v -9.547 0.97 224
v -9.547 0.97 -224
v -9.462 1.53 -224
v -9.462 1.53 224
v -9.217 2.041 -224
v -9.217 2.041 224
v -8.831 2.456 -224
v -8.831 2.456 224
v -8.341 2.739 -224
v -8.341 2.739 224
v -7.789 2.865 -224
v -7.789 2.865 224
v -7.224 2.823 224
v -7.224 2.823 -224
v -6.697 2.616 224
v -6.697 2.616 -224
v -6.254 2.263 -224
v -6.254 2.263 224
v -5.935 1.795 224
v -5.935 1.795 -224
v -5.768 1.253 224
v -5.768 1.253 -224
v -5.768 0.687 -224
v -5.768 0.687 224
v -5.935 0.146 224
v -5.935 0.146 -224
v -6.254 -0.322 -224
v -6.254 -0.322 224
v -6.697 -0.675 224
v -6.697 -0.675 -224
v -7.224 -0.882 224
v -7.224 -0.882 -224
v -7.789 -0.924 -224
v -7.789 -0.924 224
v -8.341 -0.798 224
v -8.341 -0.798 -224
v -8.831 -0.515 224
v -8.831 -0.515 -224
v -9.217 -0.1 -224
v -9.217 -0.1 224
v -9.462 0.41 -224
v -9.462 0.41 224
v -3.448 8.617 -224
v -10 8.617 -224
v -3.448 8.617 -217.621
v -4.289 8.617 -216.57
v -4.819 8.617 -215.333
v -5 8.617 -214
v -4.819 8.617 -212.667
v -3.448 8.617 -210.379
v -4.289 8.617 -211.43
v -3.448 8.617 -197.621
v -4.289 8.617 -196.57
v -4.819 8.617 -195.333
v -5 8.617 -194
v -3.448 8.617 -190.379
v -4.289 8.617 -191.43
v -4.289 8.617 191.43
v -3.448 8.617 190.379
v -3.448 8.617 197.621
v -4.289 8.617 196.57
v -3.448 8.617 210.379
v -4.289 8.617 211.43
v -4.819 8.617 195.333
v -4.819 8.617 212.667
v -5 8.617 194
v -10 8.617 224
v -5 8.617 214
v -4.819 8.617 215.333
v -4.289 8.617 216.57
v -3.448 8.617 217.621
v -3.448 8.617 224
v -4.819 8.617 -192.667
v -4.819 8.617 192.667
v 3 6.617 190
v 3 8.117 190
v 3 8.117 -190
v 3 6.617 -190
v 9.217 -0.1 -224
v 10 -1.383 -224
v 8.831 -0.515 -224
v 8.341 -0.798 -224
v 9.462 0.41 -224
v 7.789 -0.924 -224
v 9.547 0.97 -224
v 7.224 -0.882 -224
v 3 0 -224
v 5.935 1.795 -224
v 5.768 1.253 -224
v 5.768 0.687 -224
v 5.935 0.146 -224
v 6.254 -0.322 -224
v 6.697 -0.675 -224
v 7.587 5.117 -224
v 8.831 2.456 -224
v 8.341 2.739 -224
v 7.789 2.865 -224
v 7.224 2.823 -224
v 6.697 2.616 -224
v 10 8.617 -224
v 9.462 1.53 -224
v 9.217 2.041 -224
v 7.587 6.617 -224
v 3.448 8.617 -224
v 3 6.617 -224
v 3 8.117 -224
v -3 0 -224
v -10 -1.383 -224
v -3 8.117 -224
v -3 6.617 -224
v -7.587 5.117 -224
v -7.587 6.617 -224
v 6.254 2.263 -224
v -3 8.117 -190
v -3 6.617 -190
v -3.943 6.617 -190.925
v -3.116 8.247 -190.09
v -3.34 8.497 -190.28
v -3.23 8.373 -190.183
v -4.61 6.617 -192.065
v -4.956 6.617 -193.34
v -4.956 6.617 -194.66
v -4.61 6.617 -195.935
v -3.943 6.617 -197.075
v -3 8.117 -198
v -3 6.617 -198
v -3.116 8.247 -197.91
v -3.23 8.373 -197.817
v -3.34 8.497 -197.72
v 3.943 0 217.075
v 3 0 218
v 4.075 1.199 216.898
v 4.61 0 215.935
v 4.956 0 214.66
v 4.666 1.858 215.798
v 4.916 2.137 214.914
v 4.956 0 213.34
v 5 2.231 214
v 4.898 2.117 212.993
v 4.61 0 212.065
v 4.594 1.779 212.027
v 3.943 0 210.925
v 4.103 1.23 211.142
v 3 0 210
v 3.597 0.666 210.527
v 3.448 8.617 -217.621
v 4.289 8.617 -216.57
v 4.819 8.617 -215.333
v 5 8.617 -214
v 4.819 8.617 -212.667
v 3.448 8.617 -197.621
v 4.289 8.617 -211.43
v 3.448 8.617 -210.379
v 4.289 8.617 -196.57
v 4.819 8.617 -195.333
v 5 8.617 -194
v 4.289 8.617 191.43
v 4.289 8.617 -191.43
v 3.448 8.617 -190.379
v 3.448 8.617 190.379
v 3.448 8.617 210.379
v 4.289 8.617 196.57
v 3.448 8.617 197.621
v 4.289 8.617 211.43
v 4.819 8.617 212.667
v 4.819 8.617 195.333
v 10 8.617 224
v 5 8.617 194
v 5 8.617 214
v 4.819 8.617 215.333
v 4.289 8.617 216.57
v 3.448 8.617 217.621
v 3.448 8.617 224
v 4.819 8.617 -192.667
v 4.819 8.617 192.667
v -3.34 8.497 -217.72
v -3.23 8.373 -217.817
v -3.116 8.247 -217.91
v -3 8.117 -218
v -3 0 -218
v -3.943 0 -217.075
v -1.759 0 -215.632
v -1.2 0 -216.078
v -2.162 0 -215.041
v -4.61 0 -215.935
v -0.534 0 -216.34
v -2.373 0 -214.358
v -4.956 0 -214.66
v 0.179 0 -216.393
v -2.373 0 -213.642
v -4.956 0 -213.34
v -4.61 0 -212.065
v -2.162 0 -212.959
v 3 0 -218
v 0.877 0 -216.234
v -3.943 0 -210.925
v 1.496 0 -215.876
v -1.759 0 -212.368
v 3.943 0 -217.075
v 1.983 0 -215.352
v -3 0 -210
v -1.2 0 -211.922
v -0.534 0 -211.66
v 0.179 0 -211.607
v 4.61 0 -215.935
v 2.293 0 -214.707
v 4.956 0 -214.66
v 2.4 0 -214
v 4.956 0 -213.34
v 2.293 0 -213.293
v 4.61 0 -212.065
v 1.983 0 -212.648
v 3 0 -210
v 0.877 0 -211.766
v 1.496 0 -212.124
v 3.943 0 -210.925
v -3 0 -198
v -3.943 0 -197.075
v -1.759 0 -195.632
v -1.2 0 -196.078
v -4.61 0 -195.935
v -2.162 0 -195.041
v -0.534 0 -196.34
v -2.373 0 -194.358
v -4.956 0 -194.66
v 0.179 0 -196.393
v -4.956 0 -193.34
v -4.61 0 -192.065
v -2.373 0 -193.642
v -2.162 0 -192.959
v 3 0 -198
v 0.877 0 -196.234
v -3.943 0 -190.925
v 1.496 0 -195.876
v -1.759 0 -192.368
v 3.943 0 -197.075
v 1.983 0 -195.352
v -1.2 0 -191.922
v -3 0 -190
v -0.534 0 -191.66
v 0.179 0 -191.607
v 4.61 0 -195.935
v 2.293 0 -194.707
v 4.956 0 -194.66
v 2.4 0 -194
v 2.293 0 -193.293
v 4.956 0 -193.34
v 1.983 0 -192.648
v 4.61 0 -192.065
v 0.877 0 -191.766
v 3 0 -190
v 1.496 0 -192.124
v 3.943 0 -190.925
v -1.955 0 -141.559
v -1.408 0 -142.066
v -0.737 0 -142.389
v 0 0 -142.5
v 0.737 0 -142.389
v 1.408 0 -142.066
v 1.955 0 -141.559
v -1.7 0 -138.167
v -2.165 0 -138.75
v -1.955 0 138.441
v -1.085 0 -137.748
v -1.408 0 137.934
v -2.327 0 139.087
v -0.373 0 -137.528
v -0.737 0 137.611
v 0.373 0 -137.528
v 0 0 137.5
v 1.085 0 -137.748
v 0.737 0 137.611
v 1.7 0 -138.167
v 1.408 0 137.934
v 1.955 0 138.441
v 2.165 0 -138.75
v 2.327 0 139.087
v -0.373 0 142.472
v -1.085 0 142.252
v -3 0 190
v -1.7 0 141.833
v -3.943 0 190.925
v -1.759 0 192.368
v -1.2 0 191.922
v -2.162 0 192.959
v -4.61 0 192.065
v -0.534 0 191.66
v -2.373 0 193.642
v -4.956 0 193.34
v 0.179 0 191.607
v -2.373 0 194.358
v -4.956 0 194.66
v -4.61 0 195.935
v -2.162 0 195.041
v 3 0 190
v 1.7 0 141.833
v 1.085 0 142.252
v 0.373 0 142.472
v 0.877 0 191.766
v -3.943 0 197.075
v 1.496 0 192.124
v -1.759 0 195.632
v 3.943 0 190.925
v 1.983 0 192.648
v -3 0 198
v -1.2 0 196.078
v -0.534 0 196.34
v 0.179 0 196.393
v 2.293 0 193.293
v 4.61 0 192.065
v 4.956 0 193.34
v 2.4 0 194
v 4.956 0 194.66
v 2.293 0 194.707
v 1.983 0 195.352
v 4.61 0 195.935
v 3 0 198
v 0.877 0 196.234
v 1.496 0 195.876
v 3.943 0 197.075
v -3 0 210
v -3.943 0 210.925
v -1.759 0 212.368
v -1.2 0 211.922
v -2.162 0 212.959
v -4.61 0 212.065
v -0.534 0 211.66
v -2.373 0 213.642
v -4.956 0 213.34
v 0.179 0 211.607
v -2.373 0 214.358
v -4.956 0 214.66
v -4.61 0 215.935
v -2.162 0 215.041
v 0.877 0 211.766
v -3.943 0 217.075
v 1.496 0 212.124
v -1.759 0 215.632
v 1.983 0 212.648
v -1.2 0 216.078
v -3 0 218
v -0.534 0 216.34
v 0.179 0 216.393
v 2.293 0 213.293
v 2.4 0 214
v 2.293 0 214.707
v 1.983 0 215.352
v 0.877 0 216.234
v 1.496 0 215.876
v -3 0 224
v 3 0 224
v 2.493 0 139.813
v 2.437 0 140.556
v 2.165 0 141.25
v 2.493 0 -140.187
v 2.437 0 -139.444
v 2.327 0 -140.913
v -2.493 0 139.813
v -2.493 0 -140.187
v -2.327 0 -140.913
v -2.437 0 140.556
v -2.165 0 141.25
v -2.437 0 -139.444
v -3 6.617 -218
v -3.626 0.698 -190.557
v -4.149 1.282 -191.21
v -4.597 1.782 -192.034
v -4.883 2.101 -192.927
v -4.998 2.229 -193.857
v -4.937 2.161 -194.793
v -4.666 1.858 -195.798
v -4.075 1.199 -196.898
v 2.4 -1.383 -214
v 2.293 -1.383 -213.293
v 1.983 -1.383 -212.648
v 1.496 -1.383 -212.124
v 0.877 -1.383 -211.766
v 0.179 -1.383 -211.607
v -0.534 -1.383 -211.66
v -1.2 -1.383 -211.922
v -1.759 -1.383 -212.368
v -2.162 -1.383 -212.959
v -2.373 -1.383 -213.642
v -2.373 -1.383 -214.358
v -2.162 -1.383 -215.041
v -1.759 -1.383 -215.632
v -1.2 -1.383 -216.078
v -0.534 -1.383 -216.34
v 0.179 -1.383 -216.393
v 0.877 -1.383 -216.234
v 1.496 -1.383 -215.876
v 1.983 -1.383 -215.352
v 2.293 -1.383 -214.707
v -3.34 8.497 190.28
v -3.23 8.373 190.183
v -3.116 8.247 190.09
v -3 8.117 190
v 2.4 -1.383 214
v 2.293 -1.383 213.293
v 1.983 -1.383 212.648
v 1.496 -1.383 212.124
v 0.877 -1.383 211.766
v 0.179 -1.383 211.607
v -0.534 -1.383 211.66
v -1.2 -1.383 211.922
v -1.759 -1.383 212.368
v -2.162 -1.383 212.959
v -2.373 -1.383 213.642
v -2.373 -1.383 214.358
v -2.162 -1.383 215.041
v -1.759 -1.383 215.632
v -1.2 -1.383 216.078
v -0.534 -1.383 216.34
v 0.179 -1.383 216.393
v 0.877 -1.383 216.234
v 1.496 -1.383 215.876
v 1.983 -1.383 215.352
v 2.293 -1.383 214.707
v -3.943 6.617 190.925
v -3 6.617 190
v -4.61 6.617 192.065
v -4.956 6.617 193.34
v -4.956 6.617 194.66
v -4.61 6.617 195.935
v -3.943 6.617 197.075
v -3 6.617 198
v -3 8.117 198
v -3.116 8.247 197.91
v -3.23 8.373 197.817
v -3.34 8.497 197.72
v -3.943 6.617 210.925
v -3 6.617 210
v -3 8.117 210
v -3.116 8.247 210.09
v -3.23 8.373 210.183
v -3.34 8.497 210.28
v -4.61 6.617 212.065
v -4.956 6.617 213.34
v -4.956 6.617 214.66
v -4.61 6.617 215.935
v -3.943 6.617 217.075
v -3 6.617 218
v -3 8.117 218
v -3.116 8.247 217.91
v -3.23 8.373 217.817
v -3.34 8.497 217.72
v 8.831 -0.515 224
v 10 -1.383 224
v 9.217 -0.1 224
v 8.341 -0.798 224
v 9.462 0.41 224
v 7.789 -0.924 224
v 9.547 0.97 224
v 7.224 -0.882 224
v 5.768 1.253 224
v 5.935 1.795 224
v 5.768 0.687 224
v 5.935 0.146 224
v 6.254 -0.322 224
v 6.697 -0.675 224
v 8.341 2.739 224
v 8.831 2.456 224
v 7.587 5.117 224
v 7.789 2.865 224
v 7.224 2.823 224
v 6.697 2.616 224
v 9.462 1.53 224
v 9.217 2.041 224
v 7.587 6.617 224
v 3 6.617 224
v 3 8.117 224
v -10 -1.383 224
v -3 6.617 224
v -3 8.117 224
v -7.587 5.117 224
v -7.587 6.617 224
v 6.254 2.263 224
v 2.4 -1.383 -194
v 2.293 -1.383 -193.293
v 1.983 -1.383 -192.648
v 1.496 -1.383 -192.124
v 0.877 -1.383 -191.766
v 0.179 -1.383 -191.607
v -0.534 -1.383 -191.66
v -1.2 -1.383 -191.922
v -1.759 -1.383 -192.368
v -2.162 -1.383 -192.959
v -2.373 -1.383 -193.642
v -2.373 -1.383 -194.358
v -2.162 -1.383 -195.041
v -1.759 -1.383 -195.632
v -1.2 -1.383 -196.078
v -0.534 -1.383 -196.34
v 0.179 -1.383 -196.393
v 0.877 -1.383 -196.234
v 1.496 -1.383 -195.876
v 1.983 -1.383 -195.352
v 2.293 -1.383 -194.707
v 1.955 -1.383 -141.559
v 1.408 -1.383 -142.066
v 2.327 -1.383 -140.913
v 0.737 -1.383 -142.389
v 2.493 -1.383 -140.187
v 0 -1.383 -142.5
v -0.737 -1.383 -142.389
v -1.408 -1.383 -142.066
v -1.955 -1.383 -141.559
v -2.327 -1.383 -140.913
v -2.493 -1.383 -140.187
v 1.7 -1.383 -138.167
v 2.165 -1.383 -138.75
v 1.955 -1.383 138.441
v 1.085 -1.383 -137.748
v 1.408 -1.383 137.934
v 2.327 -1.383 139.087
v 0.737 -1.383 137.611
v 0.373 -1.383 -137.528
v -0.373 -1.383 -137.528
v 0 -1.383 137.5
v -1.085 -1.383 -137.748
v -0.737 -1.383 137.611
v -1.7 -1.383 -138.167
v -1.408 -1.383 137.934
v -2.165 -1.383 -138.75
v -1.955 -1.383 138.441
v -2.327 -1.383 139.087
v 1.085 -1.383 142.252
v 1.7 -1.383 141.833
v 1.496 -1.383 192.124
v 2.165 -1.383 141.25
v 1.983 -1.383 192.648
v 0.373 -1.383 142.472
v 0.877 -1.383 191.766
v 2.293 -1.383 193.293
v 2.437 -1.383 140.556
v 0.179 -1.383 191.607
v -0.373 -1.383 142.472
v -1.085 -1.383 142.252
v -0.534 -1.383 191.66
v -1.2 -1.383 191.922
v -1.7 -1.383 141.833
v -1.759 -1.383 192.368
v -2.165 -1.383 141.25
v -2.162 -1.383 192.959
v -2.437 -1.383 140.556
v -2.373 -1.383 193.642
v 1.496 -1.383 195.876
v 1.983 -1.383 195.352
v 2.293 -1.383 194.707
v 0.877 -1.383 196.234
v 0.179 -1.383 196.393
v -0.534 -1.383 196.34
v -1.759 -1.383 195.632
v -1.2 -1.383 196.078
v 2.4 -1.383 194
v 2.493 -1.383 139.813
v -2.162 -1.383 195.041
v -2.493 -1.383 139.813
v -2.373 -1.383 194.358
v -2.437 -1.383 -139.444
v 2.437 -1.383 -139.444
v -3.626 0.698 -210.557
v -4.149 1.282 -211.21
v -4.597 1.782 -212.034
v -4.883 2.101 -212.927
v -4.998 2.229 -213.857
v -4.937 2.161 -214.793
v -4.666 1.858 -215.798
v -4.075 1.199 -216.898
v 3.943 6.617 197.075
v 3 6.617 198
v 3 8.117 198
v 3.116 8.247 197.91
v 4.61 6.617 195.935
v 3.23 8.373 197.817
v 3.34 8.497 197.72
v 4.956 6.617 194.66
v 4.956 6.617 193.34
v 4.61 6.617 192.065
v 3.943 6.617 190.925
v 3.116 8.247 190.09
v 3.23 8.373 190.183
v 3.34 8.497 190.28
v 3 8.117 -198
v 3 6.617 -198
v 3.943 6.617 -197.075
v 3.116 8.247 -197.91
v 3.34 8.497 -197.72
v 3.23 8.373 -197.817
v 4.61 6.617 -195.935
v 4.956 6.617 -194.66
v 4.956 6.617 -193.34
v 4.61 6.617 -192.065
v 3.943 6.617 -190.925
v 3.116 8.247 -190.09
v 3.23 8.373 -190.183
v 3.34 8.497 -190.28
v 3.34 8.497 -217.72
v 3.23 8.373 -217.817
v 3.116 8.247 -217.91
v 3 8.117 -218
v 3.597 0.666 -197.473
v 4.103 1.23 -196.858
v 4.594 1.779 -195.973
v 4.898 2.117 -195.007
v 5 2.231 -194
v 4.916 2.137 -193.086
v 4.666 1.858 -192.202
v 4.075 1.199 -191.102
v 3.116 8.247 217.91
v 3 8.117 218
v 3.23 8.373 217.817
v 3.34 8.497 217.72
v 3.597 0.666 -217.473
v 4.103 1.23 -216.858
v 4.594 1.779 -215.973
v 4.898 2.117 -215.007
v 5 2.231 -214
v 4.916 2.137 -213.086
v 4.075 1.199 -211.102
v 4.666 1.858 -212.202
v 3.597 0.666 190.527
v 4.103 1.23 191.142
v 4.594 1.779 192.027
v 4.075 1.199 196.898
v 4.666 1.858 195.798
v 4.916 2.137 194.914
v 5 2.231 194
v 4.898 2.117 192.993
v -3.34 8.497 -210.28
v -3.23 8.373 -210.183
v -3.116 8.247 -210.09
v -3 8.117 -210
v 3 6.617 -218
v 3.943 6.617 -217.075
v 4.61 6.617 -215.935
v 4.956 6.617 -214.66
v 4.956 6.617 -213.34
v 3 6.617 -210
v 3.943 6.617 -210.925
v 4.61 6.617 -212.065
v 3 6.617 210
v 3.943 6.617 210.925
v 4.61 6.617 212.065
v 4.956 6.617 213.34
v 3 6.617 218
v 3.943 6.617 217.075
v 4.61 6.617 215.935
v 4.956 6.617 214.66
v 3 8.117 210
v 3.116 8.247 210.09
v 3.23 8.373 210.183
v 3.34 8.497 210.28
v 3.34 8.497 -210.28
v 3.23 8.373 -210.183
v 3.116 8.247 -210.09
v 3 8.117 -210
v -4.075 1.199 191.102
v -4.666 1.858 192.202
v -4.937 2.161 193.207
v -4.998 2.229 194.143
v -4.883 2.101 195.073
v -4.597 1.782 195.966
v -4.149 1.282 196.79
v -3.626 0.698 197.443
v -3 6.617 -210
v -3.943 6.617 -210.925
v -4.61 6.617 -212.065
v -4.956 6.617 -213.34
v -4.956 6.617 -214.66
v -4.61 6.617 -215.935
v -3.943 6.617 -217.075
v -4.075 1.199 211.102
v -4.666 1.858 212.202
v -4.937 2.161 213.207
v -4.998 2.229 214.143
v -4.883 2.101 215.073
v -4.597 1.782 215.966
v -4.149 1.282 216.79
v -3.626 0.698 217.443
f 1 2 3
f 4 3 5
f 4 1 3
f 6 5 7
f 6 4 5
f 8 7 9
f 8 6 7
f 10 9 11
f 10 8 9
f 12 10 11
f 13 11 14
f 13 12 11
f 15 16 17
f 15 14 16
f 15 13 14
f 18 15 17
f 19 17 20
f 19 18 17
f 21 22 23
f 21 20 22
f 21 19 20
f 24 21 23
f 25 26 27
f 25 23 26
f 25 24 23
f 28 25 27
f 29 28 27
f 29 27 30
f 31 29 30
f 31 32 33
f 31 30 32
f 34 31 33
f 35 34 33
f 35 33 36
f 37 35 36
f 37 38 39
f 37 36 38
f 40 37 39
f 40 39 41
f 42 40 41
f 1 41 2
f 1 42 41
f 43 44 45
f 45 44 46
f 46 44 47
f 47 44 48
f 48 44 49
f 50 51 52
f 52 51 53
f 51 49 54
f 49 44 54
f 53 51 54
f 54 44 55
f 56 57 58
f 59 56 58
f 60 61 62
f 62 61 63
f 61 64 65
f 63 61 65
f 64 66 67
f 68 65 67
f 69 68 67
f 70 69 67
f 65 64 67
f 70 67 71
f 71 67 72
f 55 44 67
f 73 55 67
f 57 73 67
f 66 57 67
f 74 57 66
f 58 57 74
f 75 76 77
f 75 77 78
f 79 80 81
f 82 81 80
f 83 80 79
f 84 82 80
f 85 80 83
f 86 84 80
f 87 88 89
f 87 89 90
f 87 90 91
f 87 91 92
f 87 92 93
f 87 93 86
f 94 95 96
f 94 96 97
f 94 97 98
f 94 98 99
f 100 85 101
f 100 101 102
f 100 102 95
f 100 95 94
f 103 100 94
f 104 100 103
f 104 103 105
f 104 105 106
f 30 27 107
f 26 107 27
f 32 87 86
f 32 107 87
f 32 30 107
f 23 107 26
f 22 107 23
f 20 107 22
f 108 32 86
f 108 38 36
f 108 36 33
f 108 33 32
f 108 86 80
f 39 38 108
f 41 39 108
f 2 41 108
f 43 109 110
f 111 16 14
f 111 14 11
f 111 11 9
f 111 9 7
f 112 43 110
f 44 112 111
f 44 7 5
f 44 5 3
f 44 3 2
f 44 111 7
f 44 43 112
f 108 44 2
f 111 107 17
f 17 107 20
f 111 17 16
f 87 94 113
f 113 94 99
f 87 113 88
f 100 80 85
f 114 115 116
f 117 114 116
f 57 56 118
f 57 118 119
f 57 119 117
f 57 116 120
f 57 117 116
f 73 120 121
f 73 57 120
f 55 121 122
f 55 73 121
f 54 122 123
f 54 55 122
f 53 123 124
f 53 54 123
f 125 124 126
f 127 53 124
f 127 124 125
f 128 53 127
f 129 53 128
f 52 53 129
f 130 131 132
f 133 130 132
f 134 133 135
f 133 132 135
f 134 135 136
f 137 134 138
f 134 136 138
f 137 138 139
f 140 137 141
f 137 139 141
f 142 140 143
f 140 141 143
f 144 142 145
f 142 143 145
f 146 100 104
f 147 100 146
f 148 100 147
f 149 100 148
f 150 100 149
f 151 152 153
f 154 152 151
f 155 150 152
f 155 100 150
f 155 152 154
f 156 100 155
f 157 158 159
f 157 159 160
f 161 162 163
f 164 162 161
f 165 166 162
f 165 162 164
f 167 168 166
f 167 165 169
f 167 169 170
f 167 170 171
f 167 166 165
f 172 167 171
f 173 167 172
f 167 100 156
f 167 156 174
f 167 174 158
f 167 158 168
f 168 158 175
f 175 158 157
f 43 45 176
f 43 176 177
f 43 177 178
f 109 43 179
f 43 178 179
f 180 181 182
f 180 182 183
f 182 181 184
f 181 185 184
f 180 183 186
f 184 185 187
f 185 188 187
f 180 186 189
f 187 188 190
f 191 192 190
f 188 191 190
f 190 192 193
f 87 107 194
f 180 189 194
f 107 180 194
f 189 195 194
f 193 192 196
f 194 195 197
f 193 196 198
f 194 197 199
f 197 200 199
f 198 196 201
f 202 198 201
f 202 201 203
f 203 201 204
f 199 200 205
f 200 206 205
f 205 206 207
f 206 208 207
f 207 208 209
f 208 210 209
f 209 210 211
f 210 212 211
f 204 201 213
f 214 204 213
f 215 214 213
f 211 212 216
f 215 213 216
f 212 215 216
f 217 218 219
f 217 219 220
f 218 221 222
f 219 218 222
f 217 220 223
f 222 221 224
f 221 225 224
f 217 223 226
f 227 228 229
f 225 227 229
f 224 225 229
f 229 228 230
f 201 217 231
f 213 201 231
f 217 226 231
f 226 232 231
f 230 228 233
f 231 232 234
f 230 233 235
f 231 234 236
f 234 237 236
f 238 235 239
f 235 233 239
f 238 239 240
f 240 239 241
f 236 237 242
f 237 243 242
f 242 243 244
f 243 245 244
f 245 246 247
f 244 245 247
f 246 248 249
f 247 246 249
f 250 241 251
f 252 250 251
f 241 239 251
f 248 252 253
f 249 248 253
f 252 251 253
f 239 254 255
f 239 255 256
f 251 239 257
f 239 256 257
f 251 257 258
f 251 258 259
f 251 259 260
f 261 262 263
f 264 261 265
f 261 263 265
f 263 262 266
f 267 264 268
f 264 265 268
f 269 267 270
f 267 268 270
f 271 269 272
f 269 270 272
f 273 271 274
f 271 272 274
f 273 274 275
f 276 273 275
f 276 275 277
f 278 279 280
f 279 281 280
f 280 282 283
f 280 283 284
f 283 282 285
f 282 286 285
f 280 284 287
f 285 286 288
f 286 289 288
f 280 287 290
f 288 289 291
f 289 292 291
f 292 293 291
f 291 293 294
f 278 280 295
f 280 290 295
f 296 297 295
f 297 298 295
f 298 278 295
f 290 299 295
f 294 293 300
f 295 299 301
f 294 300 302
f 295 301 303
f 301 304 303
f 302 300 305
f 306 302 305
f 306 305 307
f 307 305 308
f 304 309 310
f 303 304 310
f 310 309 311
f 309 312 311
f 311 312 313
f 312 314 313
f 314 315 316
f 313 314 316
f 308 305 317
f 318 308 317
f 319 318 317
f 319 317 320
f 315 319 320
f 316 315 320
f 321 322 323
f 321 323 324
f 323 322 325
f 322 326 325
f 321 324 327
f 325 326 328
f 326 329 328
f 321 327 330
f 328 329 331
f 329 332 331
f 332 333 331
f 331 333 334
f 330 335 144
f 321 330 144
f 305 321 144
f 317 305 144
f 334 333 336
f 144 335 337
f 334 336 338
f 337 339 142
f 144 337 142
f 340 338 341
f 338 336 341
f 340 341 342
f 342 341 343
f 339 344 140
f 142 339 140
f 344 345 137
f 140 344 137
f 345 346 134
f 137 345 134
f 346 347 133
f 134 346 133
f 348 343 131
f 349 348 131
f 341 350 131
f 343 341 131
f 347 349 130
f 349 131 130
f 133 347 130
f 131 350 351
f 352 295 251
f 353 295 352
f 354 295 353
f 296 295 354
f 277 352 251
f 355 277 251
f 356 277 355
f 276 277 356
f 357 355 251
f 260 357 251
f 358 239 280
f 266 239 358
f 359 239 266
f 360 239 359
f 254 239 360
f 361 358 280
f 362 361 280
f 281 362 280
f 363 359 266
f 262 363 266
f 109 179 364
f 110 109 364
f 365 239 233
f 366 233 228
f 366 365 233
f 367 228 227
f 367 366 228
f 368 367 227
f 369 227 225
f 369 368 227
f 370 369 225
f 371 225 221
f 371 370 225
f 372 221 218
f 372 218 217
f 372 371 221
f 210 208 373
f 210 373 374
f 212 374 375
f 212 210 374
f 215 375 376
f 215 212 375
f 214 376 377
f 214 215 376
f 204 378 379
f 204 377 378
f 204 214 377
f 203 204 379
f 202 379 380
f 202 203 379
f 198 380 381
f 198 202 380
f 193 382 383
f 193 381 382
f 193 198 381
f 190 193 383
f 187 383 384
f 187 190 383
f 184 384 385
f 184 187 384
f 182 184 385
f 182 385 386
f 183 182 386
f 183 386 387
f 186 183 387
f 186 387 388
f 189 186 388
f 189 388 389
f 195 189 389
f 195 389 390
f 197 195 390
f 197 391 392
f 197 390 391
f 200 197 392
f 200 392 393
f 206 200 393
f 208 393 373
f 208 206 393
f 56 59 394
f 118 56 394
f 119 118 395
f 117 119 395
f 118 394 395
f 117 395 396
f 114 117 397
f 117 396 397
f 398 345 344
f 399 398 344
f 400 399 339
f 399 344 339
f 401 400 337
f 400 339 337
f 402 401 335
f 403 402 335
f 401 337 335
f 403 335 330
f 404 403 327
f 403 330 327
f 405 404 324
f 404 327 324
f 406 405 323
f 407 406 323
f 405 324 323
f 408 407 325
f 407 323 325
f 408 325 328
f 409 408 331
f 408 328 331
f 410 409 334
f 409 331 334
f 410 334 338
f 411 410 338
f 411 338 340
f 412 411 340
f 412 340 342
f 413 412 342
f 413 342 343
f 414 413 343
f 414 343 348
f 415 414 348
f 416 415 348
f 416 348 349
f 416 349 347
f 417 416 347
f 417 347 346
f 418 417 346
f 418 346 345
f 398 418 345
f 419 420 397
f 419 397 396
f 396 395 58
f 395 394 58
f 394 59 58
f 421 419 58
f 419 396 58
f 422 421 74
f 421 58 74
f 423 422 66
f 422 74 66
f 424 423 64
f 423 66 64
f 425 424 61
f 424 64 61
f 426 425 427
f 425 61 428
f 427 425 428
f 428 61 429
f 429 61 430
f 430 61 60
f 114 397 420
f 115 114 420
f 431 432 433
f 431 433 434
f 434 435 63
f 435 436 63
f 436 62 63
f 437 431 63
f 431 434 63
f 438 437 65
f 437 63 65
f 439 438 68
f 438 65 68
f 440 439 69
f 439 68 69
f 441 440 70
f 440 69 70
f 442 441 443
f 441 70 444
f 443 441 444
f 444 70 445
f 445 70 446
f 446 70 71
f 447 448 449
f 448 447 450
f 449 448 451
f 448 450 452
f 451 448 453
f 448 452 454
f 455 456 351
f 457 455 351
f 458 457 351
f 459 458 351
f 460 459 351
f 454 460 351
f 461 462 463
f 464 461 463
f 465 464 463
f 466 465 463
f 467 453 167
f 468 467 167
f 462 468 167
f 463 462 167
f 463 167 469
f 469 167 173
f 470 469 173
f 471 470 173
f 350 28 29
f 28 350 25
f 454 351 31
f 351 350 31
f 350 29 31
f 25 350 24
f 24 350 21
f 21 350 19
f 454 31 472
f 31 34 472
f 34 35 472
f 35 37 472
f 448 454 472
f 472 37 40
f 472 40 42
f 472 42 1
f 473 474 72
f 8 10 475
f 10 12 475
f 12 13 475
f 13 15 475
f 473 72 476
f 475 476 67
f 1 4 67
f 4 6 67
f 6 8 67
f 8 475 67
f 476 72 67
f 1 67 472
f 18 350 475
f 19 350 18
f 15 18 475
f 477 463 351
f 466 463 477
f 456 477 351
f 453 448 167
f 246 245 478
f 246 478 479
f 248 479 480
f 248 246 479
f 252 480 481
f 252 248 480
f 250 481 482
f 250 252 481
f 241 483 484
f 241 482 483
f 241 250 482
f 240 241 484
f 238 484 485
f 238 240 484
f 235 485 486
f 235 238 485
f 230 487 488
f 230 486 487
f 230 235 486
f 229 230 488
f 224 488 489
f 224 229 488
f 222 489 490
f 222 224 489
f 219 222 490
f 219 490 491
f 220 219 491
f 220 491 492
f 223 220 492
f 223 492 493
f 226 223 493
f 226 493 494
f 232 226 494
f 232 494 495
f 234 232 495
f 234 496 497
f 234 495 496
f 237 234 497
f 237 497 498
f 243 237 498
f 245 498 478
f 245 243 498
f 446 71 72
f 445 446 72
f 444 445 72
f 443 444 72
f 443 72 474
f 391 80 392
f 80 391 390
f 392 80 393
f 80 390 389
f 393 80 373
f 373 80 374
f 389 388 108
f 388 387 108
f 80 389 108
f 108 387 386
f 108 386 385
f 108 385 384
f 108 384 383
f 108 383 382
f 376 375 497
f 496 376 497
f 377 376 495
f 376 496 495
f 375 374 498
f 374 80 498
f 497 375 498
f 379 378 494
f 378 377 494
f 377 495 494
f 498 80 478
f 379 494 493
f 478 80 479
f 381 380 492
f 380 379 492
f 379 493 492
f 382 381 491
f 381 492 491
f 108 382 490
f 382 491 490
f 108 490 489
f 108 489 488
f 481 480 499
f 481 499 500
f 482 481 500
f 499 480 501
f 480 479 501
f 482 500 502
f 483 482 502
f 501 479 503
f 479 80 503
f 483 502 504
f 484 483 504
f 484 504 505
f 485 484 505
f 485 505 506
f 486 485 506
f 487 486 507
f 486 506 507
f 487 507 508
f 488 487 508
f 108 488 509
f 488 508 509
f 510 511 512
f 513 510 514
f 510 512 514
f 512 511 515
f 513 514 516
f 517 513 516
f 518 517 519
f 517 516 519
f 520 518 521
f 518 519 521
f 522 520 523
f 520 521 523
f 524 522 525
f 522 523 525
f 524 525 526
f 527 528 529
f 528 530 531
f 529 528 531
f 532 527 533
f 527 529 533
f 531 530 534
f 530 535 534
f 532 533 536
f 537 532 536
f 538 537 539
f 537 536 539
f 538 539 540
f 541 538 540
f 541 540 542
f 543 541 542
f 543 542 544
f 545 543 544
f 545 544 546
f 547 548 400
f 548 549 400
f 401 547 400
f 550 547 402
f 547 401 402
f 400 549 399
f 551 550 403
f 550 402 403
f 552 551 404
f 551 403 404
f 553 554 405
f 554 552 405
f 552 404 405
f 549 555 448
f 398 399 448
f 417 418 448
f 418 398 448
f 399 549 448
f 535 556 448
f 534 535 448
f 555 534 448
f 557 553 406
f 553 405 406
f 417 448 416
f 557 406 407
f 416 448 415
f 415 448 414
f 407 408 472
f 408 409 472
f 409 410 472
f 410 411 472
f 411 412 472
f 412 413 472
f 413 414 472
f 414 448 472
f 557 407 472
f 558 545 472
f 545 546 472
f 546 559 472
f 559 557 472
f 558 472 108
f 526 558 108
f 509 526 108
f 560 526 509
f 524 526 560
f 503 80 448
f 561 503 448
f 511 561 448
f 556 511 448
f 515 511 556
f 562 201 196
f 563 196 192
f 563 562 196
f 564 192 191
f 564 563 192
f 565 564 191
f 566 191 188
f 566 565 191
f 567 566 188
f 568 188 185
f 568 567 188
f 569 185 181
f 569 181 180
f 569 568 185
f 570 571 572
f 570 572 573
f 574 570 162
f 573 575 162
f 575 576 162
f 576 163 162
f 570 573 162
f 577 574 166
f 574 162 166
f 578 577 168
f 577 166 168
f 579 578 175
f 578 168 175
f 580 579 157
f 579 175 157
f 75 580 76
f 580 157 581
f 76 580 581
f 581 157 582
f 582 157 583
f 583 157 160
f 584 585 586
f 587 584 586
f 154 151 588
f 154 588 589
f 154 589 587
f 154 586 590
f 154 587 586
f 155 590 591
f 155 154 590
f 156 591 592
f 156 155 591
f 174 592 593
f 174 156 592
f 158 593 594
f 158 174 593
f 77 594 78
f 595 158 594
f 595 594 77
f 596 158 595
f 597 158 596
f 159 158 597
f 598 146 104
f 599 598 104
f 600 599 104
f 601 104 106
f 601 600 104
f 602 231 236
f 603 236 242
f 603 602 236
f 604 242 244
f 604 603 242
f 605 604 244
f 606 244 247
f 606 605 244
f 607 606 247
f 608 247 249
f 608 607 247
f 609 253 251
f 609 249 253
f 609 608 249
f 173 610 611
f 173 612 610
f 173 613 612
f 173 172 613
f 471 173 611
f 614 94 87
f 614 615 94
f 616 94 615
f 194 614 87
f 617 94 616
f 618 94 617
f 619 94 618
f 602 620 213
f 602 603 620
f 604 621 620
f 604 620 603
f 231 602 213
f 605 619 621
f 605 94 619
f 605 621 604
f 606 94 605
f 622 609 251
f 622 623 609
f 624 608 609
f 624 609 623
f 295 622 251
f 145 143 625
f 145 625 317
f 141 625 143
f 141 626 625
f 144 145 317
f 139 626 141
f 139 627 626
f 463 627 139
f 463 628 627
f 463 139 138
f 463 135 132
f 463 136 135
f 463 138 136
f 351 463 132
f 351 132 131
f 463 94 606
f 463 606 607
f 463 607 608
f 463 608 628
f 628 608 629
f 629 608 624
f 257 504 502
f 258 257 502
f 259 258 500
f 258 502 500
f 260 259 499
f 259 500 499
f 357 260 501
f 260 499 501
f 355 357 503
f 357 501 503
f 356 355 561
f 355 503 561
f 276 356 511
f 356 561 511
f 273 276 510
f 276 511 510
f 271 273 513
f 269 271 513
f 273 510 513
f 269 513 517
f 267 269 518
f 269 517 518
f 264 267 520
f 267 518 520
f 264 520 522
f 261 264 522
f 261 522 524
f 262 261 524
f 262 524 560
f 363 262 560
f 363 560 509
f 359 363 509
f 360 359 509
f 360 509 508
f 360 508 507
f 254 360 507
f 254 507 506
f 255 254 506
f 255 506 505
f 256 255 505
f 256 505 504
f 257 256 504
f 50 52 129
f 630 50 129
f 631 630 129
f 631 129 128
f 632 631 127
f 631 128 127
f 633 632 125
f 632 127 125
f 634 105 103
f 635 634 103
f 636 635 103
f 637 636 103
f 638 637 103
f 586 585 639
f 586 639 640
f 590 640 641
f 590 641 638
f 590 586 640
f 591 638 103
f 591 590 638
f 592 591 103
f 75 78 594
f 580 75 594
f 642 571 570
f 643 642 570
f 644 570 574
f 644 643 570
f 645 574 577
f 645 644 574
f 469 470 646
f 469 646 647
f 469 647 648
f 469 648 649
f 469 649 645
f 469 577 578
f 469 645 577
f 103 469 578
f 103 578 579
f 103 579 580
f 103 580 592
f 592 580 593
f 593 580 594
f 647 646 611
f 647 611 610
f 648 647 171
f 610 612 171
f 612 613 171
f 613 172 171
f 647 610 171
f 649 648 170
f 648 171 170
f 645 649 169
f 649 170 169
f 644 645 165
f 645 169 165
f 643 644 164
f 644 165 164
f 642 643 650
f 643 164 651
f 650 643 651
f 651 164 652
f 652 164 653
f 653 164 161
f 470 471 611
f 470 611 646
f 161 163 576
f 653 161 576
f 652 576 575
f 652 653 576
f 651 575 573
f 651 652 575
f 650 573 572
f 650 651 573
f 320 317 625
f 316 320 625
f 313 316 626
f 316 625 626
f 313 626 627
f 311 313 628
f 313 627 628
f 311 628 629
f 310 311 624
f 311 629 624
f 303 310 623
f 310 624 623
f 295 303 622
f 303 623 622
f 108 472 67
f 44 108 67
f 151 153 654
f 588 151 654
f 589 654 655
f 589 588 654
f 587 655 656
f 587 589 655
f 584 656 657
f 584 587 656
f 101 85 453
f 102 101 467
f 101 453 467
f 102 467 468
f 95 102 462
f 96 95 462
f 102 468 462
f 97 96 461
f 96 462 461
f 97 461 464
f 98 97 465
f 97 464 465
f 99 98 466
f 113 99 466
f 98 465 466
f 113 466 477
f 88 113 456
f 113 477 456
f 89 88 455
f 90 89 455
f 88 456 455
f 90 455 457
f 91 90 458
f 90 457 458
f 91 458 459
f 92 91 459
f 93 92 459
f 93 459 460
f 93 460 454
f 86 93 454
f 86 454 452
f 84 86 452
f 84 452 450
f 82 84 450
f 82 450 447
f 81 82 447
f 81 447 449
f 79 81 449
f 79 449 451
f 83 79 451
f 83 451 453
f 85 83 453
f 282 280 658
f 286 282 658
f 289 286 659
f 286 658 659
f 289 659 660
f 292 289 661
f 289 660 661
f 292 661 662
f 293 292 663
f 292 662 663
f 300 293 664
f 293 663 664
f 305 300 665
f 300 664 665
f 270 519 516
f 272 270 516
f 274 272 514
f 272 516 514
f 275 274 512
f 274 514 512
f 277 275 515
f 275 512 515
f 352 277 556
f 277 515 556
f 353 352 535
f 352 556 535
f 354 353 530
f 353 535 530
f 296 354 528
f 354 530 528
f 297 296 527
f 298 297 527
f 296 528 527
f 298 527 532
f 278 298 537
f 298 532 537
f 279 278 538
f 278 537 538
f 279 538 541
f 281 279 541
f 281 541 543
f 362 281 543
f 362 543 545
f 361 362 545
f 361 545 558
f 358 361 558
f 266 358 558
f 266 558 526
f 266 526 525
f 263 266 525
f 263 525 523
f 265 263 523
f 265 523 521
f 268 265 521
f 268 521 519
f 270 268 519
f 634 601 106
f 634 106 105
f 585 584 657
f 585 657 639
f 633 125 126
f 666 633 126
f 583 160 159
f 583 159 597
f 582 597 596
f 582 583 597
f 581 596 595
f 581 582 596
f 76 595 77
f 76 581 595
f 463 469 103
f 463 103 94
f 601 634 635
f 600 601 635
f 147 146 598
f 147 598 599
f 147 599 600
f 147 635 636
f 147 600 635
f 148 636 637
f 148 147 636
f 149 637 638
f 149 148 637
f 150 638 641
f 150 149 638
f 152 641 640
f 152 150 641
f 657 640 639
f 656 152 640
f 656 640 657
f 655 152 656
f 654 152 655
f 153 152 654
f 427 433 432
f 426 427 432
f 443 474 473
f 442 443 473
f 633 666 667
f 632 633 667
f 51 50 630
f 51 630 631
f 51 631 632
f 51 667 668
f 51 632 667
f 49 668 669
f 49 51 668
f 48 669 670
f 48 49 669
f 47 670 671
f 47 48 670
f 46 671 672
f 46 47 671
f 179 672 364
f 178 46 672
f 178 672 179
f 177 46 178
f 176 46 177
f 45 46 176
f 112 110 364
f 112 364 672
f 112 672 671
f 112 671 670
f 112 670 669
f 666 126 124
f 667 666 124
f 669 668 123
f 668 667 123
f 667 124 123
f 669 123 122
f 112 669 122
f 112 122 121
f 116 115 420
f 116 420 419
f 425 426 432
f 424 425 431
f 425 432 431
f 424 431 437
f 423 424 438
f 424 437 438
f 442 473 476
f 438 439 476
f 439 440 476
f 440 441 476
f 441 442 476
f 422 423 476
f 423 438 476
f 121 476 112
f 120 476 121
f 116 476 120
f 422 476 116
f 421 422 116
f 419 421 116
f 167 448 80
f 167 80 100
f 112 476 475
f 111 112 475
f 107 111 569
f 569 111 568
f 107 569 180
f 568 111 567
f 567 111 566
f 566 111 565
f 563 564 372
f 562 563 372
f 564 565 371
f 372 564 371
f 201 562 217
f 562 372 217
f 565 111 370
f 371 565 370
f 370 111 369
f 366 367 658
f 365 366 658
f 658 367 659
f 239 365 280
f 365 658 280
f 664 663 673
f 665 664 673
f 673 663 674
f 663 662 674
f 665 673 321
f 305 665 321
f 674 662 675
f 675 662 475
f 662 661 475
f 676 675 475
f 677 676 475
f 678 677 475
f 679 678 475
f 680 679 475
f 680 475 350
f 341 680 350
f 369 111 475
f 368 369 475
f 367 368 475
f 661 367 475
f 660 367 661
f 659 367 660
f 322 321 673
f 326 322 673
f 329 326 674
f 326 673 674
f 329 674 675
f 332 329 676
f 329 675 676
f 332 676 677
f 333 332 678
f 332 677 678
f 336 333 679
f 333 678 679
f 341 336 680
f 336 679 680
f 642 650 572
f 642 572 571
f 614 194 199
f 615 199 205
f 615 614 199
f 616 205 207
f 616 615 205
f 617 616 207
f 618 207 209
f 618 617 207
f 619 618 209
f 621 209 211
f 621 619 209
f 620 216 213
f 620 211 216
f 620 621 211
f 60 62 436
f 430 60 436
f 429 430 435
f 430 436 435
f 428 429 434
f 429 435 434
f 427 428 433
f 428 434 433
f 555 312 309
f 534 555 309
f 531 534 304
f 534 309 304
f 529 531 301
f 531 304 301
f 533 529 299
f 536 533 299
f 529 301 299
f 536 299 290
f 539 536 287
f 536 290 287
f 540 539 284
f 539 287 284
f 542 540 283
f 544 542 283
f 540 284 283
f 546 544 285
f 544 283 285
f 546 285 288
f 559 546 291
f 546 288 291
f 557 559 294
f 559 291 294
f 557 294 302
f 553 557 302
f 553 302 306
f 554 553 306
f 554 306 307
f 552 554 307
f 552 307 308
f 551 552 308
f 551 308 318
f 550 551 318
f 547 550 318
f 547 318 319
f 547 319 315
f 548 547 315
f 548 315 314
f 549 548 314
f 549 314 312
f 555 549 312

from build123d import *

# Parameters (mm, degrees)
BOSS_EXTRUDE1_DEPTH  = 224
SKETCH2_R            = 1.9
CUT_EXTRUDE1_DEPTH   = 449.194436663
SKETCH3_R            = 2.5
CUT_EXTRUDE2_DEPTH   = 225.445984593
M4_CLEARANCE_HOLE1_D = 4.8
CUT_EXTRUDE3_REACH   = 226.446
SKETCH6_R            = 5


with BuildPart() as part:
    # Sketch1 → Boss-Extrude1 (new, symmetric)
    with BuildSketch(Plane.XY):
        Polygon((0, 0), (0, -1.382978723), (10, -1.382978723), (10, 8.617021277), (3.448211747, 8.617021277), (3, 8.117021277), (3, 6.617021277), (7.587018089, 6.617021277), (7.587018089, 5.117021277), (3, 0), align=None)
    boss_extrude1 = extrude(amount=BOSS_EXTRUDE1_DEPTH, both=True)

    # Mirror1: Boss-Extrude1 across plane
    add(boss_extrude1.mirror(Plane(origin=(0, 0, 0), x_dir=(0, 0, 1), z_dir=(1, 0, 0))))

    # Sketch2 → Cut-Extrude1 (cut, through all)
    with BuildSketch(Plane.XY.offset(224)):
        with Locations((7.646716257, 0.97030502)):
            Circle(SKETCH2_R)
    cut_extrude1 = extrude(amount=-CUT_EXTRUDE1_DEPTH, mode=Mode.SUBTRACT)

    # Mirror2: Cut-Extrude1 across plane
    add(cut_extrude1.mirror(Plane(origin=(0, 0, 0), x_dir=(0, 0, 1), z_dir=(1, 0, 0))), mode=Mode.SUBTRACT)

    # Sketch3 → Cut-Extrude2 (cut, through all)
    with BuildSketch(Plane.XZ.offset(1.382978723)):
        with Locations(Location((0, 140, 0), (0, 0, 270))):
            Circle(SKETCH3_R)
        with Locations(Location((0, -140, 0), (0, 0, 270))):
            Circle(SKETCH3_R)
    extrude(amount=-CUT_EXTRUDE2_DEPTH, mode=Mode.SUBTRACT)

    # M4 Clearance Hole1 (through all)
    with Locations(Plane(origin=(0, -1.382978723, 0), x_dir=(-1, 0, 0), z_dir=(0, -1, 0))):
        with Locations((0, -214), (0, -194)):
            m4_clearance_hole1 = Hole(M4_CLEARANCE_HOLE1_D / 2)

    # Mirror3: M4 Clearance Hole1 across plane
    add(m4_clearance_hole1.mirror(Plane.XY), mode=Mode.SUBTRACT)

    # Cut-Extrude3: up to this face of the body (flat: up to its plane)
    cut_extrude3_end = Plane(part.part.faces().sort_by_distance((0, 0, 0))[0])
    # Sketch6 → Cut-Extrude3 (cut, up to the picked face)
    with BuildSketch(Plane(origin=(0, 8.617021277, 0), x_dir=(1, 0, 0), z_dir=(0, 1, 0)), mode=Mode.PRIVATE) as cut_extrude3_sk1:
        with Locations((0, -214)):
            Circle(SKETCH6_R)
    cut_extrude3_tool1 = split(extrude(cut_extrude3_sk1.sketch, amount=-CUT_EXTRUDE3_REACH, mode=Mode.PRIVATE), bisect_by=cut_extrude3_end, keep=Keep.BOTH, mode=Mode.PRIVATE)
    # Sketch6 → Cut-Extrude3 (cut, up to the picked face)
    with BuildSketch(Plane(origin=(0, 8.617021277, 0), x_dir=(1, 0, 0), z_dir=(0, 1, 0)), mode=Mode.PRIVATE) as cut_extrude3_sk2:
        with Locations((0, -194)):
            Circle(SKETCH6_R)
    cut_extrude3_tool2 = split(extrude(cut_extrude3_sk2.sketch, amount=-CUT_EXTRUDE3_REACH, mode=Mode.PRIVATE), bisect_by=cut_extrude3_end, keep=Keep.BOTH, mode=Mode.PRIVATE)
    cut_extrude3_1 = cut_extrude3_tool1.solids().sort_by(Axis((0, 8.617021, 214), (0, -1, 0)))[0]
    add(cut_extrude3_1, mode=Mode.SUBTRACT)
    cut_extrude3_2 = cut_extrude3_tool2.solids().sort_by(Axis((0, 8.617021, 194), (0, -1, 0)))[0]
    add(cut_extrude3_2, mode=Mode.SUBTRACT)
    cut_extrude3 = cut_extrude3_1 + cut_extrude3_2  # Cut-Extrude3 as one shape, for the pattern or mirror that repeats it

    # Mirror4: Cut-Extrude3 across plane
    add(cut_extrude3.mirror(Plane.XY), mode=Mode.SUBTRACT)


solid = part.part
